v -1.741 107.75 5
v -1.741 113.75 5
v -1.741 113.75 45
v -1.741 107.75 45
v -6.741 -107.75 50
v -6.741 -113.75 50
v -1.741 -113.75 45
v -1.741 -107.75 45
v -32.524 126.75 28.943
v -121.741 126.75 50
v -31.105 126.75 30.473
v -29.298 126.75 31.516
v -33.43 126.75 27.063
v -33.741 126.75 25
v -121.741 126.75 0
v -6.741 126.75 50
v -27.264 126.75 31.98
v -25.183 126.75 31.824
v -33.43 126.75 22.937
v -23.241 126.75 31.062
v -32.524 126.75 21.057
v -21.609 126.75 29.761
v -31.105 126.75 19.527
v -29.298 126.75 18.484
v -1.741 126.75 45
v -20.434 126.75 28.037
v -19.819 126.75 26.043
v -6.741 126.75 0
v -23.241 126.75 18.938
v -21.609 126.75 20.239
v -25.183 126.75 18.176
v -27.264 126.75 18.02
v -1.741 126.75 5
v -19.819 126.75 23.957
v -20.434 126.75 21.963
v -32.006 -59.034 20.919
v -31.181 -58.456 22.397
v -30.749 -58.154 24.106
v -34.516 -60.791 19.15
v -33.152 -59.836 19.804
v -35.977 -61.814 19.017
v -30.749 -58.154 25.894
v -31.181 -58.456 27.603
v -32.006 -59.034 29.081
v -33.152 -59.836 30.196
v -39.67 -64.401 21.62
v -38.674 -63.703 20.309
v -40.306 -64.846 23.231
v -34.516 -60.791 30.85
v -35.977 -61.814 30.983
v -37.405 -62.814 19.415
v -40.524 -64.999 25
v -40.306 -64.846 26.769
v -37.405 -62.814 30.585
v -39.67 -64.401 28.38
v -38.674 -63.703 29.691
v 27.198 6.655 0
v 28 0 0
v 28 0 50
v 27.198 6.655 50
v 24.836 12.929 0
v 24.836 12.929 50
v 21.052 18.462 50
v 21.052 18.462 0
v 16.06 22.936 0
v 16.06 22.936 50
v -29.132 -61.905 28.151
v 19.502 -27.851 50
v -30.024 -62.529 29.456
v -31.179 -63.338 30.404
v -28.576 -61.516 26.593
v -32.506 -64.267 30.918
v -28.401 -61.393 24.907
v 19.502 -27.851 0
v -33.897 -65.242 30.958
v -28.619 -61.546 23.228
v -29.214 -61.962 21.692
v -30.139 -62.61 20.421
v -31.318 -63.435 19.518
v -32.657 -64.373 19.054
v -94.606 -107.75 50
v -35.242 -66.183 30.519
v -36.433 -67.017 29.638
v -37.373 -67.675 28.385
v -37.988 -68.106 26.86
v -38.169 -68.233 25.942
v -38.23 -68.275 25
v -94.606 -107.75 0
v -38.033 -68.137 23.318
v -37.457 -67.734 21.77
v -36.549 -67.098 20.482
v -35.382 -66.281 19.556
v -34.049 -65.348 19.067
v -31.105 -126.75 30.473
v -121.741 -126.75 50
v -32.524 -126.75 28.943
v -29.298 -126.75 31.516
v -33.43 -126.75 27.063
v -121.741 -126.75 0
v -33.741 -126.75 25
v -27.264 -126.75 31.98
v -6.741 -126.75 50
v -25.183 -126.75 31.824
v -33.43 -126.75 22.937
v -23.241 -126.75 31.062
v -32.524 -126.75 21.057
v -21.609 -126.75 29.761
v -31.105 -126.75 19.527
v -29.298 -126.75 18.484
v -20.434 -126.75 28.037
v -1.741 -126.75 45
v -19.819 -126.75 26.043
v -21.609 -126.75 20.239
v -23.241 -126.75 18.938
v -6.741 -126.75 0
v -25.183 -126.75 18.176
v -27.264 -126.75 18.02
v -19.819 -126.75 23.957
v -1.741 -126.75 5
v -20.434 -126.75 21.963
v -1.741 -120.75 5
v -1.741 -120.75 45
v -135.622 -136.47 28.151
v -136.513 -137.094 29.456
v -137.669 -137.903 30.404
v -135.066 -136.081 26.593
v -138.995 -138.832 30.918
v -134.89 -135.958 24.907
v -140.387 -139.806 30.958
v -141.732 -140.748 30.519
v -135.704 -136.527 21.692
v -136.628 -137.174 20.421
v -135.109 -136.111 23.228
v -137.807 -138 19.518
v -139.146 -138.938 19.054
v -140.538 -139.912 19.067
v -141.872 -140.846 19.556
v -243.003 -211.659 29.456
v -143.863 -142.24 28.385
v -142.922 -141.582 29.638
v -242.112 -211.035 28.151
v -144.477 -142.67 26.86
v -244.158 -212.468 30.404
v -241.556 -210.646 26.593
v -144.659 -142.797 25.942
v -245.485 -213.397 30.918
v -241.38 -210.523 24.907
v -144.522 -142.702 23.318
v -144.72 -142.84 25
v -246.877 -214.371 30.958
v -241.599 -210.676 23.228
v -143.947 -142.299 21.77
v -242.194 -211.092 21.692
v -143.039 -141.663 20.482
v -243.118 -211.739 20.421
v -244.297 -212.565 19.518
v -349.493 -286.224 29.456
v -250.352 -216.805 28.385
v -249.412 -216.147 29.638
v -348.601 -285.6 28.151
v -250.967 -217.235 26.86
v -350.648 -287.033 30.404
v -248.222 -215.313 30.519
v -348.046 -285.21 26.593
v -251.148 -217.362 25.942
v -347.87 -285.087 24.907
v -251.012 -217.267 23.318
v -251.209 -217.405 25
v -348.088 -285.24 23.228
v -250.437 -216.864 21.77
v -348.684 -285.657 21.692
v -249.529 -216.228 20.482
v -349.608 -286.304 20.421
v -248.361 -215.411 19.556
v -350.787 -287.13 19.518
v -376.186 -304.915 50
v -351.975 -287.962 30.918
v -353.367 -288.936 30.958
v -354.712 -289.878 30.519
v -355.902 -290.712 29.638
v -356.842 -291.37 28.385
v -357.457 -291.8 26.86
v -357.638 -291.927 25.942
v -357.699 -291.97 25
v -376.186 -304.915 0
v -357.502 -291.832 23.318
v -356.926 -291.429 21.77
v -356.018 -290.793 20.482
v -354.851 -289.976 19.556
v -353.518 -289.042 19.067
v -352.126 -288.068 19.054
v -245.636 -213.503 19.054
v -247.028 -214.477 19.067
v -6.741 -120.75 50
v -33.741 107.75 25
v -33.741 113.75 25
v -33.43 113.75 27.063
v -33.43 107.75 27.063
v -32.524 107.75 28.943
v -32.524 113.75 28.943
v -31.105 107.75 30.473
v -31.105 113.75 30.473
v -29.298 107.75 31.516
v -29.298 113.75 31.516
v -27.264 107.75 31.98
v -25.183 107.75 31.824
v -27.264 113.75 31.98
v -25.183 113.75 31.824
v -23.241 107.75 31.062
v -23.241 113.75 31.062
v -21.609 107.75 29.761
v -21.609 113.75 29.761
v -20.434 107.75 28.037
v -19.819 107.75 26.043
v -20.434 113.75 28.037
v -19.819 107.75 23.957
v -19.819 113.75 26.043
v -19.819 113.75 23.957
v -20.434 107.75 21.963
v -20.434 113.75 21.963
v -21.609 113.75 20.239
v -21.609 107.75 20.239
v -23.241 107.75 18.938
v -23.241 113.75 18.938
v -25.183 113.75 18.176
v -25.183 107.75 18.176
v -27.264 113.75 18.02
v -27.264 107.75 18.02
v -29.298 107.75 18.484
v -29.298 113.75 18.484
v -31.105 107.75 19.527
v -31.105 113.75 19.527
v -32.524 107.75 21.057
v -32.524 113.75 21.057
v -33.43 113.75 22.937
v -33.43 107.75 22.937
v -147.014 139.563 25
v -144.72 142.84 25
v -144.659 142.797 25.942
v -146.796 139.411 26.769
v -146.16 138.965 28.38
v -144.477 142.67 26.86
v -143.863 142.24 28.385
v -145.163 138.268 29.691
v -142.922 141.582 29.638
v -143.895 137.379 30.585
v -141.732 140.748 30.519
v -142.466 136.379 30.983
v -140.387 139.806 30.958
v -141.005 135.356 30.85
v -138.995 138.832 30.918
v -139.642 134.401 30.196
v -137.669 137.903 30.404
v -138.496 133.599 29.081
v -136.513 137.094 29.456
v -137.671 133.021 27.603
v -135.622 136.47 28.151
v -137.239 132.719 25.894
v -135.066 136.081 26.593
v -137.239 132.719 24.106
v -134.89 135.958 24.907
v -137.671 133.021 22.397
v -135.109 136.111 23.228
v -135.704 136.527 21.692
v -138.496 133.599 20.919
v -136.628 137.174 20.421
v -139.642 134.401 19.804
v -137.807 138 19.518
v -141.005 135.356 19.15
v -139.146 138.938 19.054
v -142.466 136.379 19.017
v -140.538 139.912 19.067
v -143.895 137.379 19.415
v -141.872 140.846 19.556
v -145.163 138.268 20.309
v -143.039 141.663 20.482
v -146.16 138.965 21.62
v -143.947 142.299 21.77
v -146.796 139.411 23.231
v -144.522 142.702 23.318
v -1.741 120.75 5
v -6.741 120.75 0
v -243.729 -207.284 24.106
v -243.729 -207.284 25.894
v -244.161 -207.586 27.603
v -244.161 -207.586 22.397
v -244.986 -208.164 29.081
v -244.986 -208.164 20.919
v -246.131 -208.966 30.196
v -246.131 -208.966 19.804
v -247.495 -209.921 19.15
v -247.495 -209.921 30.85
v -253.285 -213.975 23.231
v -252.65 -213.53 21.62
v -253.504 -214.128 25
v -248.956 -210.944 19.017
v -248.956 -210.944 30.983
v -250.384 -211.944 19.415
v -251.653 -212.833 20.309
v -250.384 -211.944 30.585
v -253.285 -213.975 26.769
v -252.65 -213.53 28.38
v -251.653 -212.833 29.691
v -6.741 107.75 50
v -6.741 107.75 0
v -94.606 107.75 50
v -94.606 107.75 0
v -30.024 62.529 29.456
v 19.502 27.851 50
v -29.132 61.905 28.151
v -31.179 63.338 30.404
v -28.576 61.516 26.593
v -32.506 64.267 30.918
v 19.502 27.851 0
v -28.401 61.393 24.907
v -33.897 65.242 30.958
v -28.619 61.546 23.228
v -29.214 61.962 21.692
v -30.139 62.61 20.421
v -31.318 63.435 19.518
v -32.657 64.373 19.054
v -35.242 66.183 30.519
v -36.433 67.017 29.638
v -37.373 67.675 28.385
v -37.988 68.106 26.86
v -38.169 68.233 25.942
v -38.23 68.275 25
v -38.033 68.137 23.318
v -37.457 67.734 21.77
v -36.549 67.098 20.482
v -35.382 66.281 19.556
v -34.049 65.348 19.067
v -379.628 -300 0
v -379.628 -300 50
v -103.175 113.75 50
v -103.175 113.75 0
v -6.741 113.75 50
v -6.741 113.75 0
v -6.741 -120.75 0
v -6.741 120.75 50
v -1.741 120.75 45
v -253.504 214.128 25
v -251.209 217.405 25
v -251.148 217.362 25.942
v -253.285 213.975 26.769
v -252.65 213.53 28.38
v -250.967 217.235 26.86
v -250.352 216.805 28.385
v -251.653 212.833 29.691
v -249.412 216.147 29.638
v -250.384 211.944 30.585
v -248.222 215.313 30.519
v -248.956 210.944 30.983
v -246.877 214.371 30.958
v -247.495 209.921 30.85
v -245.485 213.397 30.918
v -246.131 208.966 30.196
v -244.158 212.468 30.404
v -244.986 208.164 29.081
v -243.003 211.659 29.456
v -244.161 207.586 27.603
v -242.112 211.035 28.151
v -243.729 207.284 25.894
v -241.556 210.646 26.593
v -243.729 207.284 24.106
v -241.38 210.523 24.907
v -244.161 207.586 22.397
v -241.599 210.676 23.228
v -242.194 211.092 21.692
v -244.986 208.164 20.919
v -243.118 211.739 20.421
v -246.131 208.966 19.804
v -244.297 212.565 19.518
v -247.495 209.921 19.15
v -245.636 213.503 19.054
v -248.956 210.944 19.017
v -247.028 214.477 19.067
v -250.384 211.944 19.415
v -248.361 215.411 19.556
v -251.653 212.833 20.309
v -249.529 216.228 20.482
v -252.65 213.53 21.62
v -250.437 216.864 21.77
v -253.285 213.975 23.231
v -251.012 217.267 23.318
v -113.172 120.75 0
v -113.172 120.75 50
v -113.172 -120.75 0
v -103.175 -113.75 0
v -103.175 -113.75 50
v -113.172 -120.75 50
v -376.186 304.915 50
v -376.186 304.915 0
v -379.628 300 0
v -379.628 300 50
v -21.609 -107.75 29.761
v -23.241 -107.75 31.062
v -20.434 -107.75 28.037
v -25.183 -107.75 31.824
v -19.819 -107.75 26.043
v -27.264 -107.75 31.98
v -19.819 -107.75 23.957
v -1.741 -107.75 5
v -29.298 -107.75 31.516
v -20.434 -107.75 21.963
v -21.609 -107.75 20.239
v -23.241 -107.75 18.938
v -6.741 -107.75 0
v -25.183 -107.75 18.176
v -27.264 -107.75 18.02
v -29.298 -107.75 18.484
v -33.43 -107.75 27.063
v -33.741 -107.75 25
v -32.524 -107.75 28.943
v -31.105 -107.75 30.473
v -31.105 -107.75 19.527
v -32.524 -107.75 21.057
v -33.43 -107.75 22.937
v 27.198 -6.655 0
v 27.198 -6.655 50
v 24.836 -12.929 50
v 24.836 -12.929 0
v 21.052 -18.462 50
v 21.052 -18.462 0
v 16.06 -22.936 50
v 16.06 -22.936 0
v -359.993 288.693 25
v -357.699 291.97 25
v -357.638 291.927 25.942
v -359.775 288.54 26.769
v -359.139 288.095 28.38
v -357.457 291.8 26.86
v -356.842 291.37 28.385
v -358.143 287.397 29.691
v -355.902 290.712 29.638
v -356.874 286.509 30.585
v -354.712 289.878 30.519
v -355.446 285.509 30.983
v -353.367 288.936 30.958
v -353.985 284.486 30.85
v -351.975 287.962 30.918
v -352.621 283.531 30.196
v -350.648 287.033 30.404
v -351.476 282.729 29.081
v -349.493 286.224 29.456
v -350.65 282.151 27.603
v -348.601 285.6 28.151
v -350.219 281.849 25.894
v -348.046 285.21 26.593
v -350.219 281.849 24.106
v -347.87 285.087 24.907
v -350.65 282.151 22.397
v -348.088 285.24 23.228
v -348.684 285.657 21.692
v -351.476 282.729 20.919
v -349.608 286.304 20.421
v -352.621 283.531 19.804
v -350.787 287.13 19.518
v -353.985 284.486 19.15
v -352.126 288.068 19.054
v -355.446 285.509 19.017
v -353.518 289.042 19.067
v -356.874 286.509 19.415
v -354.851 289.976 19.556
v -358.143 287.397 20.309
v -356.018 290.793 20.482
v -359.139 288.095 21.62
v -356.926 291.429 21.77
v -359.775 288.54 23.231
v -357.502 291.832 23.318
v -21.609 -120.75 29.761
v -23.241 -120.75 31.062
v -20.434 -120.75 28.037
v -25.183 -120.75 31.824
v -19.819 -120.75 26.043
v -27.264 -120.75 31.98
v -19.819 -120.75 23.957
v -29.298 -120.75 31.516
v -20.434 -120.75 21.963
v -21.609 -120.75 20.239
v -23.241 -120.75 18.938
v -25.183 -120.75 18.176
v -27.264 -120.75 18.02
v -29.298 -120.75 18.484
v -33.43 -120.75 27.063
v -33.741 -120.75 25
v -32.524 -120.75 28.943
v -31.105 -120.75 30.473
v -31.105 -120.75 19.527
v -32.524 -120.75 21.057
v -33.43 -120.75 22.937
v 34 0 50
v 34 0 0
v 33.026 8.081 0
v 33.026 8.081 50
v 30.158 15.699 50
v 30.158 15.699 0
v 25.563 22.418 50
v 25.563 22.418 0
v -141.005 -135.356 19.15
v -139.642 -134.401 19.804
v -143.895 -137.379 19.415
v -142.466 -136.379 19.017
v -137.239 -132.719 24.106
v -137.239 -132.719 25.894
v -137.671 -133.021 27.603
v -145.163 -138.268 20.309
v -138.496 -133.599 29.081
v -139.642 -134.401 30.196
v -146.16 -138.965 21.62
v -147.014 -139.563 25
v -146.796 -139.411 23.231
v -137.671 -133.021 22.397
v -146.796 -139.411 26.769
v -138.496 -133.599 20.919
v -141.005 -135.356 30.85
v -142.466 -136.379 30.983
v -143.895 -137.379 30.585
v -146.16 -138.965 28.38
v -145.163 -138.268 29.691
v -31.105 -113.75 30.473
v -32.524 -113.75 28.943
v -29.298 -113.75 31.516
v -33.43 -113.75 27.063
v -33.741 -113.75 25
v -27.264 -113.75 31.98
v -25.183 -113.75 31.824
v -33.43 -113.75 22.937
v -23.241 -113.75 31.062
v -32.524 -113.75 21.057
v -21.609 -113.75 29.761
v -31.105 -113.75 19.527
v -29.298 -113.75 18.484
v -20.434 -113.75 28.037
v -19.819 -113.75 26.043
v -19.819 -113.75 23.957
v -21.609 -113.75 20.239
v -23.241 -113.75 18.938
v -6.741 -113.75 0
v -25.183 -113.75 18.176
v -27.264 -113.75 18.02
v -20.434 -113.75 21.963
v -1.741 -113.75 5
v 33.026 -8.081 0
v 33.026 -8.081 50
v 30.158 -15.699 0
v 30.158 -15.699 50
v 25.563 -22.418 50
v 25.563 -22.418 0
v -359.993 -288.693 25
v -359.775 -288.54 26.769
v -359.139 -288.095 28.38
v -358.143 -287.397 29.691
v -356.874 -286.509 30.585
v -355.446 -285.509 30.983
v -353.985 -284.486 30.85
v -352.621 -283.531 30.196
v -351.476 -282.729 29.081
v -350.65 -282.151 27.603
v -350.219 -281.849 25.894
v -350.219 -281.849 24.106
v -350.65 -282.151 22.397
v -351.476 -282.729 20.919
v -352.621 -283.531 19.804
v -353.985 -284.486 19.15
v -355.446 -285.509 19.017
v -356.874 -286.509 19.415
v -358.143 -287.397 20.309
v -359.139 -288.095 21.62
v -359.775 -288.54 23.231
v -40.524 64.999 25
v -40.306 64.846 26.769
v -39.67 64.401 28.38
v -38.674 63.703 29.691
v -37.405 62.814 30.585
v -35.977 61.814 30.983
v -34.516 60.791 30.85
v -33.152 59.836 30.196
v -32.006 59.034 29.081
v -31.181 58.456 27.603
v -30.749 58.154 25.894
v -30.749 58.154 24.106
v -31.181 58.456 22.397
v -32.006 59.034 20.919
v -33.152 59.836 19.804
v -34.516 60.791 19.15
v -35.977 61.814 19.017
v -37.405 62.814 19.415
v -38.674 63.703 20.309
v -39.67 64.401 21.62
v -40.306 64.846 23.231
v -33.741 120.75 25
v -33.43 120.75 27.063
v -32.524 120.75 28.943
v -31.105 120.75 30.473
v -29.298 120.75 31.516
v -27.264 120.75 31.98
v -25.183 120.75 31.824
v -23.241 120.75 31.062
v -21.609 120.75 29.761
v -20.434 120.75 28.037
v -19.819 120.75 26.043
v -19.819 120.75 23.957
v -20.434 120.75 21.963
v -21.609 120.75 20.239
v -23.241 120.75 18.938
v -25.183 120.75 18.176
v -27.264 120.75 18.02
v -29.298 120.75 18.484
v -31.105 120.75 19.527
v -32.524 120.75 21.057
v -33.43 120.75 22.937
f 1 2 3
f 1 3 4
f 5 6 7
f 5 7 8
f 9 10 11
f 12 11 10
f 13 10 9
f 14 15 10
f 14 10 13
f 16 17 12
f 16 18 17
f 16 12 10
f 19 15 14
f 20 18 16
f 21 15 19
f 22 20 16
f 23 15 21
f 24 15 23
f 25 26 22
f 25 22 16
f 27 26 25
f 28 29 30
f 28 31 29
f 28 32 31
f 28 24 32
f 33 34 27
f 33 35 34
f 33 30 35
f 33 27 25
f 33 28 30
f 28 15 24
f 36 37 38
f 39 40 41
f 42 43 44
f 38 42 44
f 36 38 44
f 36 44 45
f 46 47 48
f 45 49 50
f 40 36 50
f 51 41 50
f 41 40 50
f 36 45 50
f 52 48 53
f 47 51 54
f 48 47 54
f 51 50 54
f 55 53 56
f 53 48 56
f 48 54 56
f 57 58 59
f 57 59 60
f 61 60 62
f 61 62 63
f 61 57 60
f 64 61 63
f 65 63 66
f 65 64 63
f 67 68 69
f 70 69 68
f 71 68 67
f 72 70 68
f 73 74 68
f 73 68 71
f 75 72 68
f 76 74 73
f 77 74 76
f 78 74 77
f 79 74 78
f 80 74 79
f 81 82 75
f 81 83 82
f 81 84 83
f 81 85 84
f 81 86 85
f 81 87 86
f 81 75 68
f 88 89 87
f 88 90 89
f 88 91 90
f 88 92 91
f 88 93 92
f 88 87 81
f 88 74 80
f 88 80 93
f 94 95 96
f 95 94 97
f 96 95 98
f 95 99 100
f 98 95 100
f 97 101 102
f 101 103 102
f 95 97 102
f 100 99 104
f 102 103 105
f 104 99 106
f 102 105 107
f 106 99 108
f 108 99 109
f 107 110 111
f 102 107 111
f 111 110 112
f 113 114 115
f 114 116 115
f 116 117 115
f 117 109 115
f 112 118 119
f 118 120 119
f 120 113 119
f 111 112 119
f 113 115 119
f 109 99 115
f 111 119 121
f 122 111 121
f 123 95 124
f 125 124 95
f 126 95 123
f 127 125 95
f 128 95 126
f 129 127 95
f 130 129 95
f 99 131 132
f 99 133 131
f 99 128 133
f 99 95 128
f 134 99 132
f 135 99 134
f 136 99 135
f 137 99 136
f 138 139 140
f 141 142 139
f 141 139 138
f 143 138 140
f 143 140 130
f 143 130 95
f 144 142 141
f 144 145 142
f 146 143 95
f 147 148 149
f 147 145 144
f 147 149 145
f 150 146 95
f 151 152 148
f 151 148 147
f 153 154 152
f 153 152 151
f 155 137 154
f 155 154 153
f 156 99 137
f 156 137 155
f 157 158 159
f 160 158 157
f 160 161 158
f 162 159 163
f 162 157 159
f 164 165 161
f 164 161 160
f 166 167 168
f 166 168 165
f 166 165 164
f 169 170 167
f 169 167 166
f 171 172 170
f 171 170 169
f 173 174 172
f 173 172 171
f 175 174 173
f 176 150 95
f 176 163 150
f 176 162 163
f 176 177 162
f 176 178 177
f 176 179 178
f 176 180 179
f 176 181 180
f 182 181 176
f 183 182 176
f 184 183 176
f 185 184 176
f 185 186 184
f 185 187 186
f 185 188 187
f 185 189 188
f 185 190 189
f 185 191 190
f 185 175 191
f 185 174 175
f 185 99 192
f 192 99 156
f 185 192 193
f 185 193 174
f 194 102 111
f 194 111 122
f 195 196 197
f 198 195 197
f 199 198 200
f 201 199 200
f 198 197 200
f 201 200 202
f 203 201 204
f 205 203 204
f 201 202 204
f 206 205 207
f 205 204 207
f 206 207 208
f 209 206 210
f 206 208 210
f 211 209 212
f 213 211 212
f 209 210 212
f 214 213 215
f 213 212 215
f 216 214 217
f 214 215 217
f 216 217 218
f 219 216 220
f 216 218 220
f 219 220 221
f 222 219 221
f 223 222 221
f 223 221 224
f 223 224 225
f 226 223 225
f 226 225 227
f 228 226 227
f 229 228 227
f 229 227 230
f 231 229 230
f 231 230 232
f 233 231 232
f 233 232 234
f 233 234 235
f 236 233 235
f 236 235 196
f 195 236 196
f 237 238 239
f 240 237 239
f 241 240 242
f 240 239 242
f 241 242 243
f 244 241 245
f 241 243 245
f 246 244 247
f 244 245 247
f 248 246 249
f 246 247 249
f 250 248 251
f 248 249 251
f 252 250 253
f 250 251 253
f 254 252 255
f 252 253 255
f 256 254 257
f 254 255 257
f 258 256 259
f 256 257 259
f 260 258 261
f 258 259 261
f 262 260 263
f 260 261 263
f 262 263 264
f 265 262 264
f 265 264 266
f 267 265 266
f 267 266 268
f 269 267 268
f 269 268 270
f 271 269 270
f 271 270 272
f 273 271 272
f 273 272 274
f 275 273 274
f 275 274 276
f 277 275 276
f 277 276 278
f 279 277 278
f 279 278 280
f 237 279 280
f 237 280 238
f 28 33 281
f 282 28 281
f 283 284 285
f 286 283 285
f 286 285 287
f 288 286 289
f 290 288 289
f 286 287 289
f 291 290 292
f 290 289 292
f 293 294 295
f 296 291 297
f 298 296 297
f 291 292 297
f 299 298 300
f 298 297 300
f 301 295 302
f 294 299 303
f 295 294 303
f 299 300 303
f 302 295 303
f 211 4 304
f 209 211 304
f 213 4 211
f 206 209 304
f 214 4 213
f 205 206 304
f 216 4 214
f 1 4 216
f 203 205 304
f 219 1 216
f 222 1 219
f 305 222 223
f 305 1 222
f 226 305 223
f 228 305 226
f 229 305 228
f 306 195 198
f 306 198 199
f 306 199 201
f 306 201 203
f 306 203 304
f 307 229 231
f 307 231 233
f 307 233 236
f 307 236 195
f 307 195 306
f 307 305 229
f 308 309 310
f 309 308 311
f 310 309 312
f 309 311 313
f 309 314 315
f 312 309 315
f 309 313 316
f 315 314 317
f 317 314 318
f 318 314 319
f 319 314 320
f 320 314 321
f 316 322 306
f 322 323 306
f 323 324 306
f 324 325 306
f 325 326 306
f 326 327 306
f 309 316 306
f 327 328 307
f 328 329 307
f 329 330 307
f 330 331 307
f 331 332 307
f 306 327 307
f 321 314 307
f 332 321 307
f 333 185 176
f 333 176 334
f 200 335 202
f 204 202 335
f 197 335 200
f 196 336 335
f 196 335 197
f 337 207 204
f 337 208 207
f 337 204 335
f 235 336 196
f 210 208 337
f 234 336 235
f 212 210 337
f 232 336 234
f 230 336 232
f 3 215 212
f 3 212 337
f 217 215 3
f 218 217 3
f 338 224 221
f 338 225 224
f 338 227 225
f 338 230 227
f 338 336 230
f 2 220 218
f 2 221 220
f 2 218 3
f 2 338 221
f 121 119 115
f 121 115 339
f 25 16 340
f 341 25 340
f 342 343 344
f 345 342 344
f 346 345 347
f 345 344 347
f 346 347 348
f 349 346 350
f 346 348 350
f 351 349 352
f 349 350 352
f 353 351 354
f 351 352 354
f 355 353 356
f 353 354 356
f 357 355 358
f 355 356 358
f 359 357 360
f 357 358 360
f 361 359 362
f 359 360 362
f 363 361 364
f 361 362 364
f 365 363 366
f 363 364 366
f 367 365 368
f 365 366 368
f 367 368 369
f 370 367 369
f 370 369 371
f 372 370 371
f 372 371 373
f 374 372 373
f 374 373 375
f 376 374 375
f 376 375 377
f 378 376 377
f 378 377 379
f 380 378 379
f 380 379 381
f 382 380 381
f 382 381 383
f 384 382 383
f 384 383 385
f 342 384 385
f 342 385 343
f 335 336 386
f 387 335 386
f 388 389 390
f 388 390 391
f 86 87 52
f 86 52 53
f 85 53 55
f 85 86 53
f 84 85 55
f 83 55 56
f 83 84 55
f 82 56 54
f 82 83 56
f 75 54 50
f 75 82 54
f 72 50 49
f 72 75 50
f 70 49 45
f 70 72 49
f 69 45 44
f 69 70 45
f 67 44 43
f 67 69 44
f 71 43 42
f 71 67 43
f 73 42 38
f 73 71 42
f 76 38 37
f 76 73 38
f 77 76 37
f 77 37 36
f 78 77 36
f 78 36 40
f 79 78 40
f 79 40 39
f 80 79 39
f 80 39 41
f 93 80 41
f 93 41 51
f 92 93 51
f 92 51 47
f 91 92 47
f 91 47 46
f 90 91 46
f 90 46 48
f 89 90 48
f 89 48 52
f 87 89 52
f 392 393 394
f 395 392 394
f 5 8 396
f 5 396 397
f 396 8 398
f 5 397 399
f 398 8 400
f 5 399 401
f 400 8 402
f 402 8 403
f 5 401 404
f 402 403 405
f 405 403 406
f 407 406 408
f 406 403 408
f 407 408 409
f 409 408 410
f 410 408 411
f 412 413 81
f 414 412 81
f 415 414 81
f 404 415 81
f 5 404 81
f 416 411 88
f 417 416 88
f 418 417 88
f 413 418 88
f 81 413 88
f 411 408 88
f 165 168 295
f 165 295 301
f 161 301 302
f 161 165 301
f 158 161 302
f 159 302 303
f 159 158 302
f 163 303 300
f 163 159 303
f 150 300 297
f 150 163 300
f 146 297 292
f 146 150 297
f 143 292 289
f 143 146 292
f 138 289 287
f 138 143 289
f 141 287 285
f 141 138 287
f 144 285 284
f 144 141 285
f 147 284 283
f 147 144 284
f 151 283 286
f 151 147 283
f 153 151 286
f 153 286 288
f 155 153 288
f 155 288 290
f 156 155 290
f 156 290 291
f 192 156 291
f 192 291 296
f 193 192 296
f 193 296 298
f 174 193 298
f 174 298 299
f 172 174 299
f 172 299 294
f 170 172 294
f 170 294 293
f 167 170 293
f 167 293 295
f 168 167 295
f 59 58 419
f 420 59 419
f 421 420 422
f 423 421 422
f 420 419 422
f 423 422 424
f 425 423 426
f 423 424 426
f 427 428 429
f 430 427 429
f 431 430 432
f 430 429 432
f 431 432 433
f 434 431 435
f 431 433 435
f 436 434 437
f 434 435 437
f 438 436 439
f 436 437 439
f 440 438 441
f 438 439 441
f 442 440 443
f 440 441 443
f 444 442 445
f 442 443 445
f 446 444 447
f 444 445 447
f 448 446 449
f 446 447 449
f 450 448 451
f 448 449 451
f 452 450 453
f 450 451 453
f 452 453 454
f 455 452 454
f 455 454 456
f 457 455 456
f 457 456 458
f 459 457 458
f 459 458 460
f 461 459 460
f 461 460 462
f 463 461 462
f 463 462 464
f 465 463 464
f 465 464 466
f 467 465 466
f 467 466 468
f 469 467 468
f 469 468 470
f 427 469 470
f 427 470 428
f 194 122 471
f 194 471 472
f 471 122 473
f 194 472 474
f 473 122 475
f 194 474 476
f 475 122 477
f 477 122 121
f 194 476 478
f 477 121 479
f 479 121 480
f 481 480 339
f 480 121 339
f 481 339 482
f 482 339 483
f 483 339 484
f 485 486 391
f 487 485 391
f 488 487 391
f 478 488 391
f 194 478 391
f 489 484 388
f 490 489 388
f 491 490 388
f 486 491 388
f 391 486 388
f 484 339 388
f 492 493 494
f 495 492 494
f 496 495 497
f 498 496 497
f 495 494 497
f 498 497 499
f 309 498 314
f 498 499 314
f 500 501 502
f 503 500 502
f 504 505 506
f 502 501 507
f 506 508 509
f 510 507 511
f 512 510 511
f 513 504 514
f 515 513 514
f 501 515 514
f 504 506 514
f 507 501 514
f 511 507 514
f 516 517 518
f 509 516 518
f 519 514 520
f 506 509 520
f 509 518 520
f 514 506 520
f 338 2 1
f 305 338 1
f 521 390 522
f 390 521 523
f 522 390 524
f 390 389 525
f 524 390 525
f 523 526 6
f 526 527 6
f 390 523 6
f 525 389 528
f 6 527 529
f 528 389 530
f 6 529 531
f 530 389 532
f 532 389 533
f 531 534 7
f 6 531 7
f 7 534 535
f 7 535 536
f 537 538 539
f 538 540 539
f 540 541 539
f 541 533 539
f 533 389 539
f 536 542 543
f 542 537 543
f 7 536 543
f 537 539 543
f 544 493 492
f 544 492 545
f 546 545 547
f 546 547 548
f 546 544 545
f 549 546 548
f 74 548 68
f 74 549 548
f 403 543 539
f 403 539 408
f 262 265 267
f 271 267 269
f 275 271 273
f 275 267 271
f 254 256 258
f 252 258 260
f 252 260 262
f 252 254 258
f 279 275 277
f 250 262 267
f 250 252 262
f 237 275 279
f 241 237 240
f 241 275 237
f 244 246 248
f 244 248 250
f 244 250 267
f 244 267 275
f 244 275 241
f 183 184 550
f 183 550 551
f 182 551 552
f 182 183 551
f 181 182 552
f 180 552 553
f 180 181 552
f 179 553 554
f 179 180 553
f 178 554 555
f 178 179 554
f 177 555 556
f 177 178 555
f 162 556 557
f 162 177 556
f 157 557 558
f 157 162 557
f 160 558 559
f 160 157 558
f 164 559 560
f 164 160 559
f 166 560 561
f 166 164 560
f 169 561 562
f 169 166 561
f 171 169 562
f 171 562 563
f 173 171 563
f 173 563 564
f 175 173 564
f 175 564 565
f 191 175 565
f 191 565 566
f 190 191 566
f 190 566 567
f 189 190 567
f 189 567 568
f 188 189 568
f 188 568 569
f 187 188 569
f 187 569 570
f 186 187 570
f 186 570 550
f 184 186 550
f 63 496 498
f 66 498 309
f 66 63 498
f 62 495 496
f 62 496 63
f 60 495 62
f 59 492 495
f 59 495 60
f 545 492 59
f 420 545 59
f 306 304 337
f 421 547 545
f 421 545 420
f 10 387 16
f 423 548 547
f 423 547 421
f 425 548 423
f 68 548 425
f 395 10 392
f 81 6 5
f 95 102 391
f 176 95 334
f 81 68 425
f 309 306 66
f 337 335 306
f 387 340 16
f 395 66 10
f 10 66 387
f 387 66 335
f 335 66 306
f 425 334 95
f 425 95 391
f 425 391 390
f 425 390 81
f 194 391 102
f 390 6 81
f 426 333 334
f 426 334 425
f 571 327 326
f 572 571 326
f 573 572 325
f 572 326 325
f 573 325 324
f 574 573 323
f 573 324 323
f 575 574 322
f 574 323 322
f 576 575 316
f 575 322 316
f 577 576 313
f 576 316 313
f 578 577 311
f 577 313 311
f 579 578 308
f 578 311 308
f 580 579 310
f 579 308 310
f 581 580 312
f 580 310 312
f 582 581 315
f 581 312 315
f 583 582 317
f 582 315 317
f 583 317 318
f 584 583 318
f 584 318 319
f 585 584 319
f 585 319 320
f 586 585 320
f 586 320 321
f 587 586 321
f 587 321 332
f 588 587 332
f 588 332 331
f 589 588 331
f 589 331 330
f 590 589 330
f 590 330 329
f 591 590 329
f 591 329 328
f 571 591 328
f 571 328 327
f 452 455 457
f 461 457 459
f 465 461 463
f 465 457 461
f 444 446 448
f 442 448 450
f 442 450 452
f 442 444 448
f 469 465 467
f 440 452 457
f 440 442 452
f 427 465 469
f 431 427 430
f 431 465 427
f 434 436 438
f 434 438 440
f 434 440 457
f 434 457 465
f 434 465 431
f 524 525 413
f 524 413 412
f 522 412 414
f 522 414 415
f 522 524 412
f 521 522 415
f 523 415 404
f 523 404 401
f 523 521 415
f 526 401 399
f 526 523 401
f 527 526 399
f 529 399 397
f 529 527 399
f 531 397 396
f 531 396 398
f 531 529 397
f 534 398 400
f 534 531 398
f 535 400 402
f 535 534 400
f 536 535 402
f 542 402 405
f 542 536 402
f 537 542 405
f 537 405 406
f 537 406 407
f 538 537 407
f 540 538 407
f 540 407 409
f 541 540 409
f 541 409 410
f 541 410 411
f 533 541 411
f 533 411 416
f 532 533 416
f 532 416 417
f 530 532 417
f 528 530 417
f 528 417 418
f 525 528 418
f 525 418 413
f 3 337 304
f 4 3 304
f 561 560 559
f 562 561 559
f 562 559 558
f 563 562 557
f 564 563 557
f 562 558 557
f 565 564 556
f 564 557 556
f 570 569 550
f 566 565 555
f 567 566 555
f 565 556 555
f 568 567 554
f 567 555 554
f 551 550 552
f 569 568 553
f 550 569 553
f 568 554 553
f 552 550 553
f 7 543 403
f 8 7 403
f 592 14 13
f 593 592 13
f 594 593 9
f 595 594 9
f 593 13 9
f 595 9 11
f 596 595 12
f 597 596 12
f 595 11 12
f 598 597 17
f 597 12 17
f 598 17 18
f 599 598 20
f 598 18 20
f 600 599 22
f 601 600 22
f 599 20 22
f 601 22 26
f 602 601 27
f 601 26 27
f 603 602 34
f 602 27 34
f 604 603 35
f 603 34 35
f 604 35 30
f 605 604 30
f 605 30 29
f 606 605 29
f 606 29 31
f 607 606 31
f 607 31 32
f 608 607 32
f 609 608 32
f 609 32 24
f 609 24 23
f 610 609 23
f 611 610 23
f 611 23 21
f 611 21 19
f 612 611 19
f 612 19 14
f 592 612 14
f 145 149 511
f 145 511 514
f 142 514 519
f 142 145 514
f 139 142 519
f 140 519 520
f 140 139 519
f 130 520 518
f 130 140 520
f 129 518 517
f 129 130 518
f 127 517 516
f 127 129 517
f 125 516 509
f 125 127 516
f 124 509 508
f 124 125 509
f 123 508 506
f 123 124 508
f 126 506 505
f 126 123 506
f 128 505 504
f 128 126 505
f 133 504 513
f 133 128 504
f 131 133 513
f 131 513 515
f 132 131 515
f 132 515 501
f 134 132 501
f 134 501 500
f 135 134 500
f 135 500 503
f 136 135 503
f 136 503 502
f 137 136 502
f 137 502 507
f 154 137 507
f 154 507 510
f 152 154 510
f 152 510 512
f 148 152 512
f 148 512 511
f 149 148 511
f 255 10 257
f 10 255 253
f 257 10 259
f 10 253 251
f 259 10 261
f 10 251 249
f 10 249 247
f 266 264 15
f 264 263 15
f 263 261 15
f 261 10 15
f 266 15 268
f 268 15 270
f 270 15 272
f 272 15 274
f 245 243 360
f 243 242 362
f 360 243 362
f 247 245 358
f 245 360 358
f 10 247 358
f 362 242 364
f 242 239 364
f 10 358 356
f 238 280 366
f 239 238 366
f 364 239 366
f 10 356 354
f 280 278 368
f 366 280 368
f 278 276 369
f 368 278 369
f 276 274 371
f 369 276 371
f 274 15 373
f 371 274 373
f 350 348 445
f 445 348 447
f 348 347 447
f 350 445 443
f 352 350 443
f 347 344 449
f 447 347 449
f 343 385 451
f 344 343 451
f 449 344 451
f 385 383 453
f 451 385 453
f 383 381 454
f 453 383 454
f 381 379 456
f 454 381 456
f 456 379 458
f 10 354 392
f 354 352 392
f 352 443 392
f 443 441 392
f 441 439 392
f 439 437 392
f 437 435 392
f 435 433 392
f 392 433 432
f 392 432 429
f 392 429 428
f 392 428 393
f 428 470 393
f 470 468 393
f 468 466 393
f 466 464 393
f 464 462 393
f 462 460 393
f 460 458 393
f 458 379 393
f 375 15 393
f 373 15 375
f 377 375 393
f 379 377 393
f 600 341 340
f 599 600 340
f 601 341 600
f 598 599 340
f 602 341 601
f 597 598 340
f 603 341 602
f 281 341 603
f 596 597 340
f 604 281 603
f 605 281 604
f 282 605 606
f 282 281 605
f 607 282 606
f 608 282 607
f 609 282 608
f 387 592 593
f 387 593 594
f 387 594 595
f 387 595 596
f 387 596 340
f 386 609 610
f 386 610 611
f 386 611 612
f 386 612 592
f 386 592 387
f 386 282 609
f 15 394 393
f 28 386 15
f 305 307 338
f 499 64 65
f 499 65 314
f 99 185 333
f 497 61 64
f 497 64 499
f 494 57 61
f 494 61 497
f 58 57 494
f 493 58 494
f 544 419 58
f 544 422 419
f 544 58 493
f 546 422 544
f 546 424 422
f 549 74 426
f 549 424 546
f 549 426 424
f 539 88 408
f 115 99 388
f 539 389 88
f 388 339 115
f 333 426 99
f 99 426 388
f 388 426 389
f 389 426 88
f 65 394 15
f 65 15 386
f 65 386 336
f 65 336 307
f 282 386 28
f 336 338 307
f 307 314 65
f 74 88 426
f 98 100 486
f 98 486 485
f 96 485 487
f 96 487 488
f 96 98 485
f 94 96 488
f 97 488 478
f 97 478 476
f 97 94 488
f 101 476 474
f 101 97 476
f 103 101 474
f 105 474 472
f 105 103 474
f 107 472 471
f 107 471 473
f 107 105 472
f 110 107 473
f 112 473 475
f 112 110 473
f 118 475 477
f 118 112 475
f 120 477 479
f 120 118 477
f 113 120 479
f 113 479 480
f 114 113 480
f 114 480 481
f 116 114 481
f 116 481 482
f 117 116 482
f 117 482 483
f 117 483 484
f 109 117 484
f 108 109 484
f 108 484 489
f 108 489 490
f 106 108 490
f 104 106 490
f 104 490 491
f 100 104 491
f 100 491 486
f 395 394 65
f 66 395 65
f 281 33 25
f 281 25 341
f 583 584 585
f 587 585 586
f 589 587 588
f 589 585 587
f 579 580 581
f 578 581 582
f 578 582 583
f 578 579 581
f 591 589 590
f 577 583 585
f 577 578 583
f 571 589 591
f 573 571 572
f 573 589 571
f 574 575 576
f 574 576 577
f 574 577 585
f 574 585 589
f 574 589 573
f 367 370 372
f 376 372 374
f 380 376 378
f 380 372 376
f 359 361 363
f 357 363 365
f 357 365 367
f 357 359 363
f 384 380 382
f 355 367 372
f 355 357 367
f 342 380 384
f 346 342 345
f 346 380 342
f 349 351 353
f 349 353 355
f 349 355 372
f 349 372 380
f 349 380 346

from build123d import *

# Parameters (mm, degrees)
PAD_DEPTH           = 50
PAD001_DEPTH        = 50
CHAMFER_SIZE        = 5
SKETCH015_R         = 6
POCKET005_DEPTH     = 10
LINEARPATTERN_COUNT = 4
LINEARPATTERN_PITCH = 130
SKETCH016_R         = 7
POCKET_DEPTH        = 20


with BuildPart() as part:
    # Sketch → Pad (new body)
    with BuildSketch(Plane.XY):
        with BuildLine():
            Line((-379.627892, 300), (16.06014, 22.936257))
            ThreePointArc((28, 0), (24.836303, 12.928961), (16.06014, 22.936257))
            Line((34, 0), (28, 0))
            ThreePointArc((34, 0), (30.158368, 15.699453), (19.501599, 27.85117))
            Line((19.501599, 27.85117), (-376.186433, 304.914912))
            Line((-376.186433, 304.914912), (-379.627892, 300))
        make_face()
    extrude(amount=PAD_DEPTH)

    # Sketch001 → Pad001 (join)
    with BuildSketch(Plane.XY):
        Polygon((-94.605757, 107.75), (-103.174645, 113.75), (-1.740569, 113.75), (-1.740569, 107.75), align=None)
        Polygon((-113.171681, 120.75), (-121.740569, 126.75), (-1.740569, 126.75), (-1.740569, 120.75), align=None)
    extrude(amount=PAD001_DEPTH)

    # Chamfer
    chamfer_edges = [part.edges().sort_by_distance(p)[0] for p in [
        (-1.740569, 123.75, 50),
        (-1.740569, 110.75, 50),
        (-1.740569, 110.75, 0),
        (-1.740569, 123.75, 0),
    ]]
    chamfer(chamfer_edges, length=CHAMFER_SIZE)

    # Sketch015 → Pocket005 (cut)
    with BuildSketch(Plane(origin=(22.943057, 32.766082, 0), x_dir=(-0.819152, 0.573576, 0), z_dir=(0.573576, 0.819152, 0))):
        with Locations((454.477006, 25)):
            Circle(SKETCH015_R)
    pocket005 = extrude(amount=-POCKET005_DEPTH, mode=Mode.SUBTRACT)

    # LinearPattern: Pocket005 ×4
    with Locations(*[Vector(0.819152, -0.573576, 0) * (i * LINEARPATTERN_PITCH) for i in range(1, LINEARPATTERN_COUNT)]):
        add(pocket005, mode=Mode.SUBTRACT)

    # Sketch016 (on Face9 of LinearPattern) → Pocket (cut)
    with BuildSketch(Plane(origin=(0, 126.75, 0), x_dir=(-1, 0, 0), z_dir=(0, 1, 0))):
        with Locations((26.740569, 25)):
            Circle(SKETCH016_R)
    extrude(amount=-POCKET_DEPTH, mode=Mode.SUBTRACT)

    # Mirrored: part across XZ


with BuildPart() as part_1:
    add(part.part)
    add(part.part.mirror(Plane.XZ))


solid = part_1.part
